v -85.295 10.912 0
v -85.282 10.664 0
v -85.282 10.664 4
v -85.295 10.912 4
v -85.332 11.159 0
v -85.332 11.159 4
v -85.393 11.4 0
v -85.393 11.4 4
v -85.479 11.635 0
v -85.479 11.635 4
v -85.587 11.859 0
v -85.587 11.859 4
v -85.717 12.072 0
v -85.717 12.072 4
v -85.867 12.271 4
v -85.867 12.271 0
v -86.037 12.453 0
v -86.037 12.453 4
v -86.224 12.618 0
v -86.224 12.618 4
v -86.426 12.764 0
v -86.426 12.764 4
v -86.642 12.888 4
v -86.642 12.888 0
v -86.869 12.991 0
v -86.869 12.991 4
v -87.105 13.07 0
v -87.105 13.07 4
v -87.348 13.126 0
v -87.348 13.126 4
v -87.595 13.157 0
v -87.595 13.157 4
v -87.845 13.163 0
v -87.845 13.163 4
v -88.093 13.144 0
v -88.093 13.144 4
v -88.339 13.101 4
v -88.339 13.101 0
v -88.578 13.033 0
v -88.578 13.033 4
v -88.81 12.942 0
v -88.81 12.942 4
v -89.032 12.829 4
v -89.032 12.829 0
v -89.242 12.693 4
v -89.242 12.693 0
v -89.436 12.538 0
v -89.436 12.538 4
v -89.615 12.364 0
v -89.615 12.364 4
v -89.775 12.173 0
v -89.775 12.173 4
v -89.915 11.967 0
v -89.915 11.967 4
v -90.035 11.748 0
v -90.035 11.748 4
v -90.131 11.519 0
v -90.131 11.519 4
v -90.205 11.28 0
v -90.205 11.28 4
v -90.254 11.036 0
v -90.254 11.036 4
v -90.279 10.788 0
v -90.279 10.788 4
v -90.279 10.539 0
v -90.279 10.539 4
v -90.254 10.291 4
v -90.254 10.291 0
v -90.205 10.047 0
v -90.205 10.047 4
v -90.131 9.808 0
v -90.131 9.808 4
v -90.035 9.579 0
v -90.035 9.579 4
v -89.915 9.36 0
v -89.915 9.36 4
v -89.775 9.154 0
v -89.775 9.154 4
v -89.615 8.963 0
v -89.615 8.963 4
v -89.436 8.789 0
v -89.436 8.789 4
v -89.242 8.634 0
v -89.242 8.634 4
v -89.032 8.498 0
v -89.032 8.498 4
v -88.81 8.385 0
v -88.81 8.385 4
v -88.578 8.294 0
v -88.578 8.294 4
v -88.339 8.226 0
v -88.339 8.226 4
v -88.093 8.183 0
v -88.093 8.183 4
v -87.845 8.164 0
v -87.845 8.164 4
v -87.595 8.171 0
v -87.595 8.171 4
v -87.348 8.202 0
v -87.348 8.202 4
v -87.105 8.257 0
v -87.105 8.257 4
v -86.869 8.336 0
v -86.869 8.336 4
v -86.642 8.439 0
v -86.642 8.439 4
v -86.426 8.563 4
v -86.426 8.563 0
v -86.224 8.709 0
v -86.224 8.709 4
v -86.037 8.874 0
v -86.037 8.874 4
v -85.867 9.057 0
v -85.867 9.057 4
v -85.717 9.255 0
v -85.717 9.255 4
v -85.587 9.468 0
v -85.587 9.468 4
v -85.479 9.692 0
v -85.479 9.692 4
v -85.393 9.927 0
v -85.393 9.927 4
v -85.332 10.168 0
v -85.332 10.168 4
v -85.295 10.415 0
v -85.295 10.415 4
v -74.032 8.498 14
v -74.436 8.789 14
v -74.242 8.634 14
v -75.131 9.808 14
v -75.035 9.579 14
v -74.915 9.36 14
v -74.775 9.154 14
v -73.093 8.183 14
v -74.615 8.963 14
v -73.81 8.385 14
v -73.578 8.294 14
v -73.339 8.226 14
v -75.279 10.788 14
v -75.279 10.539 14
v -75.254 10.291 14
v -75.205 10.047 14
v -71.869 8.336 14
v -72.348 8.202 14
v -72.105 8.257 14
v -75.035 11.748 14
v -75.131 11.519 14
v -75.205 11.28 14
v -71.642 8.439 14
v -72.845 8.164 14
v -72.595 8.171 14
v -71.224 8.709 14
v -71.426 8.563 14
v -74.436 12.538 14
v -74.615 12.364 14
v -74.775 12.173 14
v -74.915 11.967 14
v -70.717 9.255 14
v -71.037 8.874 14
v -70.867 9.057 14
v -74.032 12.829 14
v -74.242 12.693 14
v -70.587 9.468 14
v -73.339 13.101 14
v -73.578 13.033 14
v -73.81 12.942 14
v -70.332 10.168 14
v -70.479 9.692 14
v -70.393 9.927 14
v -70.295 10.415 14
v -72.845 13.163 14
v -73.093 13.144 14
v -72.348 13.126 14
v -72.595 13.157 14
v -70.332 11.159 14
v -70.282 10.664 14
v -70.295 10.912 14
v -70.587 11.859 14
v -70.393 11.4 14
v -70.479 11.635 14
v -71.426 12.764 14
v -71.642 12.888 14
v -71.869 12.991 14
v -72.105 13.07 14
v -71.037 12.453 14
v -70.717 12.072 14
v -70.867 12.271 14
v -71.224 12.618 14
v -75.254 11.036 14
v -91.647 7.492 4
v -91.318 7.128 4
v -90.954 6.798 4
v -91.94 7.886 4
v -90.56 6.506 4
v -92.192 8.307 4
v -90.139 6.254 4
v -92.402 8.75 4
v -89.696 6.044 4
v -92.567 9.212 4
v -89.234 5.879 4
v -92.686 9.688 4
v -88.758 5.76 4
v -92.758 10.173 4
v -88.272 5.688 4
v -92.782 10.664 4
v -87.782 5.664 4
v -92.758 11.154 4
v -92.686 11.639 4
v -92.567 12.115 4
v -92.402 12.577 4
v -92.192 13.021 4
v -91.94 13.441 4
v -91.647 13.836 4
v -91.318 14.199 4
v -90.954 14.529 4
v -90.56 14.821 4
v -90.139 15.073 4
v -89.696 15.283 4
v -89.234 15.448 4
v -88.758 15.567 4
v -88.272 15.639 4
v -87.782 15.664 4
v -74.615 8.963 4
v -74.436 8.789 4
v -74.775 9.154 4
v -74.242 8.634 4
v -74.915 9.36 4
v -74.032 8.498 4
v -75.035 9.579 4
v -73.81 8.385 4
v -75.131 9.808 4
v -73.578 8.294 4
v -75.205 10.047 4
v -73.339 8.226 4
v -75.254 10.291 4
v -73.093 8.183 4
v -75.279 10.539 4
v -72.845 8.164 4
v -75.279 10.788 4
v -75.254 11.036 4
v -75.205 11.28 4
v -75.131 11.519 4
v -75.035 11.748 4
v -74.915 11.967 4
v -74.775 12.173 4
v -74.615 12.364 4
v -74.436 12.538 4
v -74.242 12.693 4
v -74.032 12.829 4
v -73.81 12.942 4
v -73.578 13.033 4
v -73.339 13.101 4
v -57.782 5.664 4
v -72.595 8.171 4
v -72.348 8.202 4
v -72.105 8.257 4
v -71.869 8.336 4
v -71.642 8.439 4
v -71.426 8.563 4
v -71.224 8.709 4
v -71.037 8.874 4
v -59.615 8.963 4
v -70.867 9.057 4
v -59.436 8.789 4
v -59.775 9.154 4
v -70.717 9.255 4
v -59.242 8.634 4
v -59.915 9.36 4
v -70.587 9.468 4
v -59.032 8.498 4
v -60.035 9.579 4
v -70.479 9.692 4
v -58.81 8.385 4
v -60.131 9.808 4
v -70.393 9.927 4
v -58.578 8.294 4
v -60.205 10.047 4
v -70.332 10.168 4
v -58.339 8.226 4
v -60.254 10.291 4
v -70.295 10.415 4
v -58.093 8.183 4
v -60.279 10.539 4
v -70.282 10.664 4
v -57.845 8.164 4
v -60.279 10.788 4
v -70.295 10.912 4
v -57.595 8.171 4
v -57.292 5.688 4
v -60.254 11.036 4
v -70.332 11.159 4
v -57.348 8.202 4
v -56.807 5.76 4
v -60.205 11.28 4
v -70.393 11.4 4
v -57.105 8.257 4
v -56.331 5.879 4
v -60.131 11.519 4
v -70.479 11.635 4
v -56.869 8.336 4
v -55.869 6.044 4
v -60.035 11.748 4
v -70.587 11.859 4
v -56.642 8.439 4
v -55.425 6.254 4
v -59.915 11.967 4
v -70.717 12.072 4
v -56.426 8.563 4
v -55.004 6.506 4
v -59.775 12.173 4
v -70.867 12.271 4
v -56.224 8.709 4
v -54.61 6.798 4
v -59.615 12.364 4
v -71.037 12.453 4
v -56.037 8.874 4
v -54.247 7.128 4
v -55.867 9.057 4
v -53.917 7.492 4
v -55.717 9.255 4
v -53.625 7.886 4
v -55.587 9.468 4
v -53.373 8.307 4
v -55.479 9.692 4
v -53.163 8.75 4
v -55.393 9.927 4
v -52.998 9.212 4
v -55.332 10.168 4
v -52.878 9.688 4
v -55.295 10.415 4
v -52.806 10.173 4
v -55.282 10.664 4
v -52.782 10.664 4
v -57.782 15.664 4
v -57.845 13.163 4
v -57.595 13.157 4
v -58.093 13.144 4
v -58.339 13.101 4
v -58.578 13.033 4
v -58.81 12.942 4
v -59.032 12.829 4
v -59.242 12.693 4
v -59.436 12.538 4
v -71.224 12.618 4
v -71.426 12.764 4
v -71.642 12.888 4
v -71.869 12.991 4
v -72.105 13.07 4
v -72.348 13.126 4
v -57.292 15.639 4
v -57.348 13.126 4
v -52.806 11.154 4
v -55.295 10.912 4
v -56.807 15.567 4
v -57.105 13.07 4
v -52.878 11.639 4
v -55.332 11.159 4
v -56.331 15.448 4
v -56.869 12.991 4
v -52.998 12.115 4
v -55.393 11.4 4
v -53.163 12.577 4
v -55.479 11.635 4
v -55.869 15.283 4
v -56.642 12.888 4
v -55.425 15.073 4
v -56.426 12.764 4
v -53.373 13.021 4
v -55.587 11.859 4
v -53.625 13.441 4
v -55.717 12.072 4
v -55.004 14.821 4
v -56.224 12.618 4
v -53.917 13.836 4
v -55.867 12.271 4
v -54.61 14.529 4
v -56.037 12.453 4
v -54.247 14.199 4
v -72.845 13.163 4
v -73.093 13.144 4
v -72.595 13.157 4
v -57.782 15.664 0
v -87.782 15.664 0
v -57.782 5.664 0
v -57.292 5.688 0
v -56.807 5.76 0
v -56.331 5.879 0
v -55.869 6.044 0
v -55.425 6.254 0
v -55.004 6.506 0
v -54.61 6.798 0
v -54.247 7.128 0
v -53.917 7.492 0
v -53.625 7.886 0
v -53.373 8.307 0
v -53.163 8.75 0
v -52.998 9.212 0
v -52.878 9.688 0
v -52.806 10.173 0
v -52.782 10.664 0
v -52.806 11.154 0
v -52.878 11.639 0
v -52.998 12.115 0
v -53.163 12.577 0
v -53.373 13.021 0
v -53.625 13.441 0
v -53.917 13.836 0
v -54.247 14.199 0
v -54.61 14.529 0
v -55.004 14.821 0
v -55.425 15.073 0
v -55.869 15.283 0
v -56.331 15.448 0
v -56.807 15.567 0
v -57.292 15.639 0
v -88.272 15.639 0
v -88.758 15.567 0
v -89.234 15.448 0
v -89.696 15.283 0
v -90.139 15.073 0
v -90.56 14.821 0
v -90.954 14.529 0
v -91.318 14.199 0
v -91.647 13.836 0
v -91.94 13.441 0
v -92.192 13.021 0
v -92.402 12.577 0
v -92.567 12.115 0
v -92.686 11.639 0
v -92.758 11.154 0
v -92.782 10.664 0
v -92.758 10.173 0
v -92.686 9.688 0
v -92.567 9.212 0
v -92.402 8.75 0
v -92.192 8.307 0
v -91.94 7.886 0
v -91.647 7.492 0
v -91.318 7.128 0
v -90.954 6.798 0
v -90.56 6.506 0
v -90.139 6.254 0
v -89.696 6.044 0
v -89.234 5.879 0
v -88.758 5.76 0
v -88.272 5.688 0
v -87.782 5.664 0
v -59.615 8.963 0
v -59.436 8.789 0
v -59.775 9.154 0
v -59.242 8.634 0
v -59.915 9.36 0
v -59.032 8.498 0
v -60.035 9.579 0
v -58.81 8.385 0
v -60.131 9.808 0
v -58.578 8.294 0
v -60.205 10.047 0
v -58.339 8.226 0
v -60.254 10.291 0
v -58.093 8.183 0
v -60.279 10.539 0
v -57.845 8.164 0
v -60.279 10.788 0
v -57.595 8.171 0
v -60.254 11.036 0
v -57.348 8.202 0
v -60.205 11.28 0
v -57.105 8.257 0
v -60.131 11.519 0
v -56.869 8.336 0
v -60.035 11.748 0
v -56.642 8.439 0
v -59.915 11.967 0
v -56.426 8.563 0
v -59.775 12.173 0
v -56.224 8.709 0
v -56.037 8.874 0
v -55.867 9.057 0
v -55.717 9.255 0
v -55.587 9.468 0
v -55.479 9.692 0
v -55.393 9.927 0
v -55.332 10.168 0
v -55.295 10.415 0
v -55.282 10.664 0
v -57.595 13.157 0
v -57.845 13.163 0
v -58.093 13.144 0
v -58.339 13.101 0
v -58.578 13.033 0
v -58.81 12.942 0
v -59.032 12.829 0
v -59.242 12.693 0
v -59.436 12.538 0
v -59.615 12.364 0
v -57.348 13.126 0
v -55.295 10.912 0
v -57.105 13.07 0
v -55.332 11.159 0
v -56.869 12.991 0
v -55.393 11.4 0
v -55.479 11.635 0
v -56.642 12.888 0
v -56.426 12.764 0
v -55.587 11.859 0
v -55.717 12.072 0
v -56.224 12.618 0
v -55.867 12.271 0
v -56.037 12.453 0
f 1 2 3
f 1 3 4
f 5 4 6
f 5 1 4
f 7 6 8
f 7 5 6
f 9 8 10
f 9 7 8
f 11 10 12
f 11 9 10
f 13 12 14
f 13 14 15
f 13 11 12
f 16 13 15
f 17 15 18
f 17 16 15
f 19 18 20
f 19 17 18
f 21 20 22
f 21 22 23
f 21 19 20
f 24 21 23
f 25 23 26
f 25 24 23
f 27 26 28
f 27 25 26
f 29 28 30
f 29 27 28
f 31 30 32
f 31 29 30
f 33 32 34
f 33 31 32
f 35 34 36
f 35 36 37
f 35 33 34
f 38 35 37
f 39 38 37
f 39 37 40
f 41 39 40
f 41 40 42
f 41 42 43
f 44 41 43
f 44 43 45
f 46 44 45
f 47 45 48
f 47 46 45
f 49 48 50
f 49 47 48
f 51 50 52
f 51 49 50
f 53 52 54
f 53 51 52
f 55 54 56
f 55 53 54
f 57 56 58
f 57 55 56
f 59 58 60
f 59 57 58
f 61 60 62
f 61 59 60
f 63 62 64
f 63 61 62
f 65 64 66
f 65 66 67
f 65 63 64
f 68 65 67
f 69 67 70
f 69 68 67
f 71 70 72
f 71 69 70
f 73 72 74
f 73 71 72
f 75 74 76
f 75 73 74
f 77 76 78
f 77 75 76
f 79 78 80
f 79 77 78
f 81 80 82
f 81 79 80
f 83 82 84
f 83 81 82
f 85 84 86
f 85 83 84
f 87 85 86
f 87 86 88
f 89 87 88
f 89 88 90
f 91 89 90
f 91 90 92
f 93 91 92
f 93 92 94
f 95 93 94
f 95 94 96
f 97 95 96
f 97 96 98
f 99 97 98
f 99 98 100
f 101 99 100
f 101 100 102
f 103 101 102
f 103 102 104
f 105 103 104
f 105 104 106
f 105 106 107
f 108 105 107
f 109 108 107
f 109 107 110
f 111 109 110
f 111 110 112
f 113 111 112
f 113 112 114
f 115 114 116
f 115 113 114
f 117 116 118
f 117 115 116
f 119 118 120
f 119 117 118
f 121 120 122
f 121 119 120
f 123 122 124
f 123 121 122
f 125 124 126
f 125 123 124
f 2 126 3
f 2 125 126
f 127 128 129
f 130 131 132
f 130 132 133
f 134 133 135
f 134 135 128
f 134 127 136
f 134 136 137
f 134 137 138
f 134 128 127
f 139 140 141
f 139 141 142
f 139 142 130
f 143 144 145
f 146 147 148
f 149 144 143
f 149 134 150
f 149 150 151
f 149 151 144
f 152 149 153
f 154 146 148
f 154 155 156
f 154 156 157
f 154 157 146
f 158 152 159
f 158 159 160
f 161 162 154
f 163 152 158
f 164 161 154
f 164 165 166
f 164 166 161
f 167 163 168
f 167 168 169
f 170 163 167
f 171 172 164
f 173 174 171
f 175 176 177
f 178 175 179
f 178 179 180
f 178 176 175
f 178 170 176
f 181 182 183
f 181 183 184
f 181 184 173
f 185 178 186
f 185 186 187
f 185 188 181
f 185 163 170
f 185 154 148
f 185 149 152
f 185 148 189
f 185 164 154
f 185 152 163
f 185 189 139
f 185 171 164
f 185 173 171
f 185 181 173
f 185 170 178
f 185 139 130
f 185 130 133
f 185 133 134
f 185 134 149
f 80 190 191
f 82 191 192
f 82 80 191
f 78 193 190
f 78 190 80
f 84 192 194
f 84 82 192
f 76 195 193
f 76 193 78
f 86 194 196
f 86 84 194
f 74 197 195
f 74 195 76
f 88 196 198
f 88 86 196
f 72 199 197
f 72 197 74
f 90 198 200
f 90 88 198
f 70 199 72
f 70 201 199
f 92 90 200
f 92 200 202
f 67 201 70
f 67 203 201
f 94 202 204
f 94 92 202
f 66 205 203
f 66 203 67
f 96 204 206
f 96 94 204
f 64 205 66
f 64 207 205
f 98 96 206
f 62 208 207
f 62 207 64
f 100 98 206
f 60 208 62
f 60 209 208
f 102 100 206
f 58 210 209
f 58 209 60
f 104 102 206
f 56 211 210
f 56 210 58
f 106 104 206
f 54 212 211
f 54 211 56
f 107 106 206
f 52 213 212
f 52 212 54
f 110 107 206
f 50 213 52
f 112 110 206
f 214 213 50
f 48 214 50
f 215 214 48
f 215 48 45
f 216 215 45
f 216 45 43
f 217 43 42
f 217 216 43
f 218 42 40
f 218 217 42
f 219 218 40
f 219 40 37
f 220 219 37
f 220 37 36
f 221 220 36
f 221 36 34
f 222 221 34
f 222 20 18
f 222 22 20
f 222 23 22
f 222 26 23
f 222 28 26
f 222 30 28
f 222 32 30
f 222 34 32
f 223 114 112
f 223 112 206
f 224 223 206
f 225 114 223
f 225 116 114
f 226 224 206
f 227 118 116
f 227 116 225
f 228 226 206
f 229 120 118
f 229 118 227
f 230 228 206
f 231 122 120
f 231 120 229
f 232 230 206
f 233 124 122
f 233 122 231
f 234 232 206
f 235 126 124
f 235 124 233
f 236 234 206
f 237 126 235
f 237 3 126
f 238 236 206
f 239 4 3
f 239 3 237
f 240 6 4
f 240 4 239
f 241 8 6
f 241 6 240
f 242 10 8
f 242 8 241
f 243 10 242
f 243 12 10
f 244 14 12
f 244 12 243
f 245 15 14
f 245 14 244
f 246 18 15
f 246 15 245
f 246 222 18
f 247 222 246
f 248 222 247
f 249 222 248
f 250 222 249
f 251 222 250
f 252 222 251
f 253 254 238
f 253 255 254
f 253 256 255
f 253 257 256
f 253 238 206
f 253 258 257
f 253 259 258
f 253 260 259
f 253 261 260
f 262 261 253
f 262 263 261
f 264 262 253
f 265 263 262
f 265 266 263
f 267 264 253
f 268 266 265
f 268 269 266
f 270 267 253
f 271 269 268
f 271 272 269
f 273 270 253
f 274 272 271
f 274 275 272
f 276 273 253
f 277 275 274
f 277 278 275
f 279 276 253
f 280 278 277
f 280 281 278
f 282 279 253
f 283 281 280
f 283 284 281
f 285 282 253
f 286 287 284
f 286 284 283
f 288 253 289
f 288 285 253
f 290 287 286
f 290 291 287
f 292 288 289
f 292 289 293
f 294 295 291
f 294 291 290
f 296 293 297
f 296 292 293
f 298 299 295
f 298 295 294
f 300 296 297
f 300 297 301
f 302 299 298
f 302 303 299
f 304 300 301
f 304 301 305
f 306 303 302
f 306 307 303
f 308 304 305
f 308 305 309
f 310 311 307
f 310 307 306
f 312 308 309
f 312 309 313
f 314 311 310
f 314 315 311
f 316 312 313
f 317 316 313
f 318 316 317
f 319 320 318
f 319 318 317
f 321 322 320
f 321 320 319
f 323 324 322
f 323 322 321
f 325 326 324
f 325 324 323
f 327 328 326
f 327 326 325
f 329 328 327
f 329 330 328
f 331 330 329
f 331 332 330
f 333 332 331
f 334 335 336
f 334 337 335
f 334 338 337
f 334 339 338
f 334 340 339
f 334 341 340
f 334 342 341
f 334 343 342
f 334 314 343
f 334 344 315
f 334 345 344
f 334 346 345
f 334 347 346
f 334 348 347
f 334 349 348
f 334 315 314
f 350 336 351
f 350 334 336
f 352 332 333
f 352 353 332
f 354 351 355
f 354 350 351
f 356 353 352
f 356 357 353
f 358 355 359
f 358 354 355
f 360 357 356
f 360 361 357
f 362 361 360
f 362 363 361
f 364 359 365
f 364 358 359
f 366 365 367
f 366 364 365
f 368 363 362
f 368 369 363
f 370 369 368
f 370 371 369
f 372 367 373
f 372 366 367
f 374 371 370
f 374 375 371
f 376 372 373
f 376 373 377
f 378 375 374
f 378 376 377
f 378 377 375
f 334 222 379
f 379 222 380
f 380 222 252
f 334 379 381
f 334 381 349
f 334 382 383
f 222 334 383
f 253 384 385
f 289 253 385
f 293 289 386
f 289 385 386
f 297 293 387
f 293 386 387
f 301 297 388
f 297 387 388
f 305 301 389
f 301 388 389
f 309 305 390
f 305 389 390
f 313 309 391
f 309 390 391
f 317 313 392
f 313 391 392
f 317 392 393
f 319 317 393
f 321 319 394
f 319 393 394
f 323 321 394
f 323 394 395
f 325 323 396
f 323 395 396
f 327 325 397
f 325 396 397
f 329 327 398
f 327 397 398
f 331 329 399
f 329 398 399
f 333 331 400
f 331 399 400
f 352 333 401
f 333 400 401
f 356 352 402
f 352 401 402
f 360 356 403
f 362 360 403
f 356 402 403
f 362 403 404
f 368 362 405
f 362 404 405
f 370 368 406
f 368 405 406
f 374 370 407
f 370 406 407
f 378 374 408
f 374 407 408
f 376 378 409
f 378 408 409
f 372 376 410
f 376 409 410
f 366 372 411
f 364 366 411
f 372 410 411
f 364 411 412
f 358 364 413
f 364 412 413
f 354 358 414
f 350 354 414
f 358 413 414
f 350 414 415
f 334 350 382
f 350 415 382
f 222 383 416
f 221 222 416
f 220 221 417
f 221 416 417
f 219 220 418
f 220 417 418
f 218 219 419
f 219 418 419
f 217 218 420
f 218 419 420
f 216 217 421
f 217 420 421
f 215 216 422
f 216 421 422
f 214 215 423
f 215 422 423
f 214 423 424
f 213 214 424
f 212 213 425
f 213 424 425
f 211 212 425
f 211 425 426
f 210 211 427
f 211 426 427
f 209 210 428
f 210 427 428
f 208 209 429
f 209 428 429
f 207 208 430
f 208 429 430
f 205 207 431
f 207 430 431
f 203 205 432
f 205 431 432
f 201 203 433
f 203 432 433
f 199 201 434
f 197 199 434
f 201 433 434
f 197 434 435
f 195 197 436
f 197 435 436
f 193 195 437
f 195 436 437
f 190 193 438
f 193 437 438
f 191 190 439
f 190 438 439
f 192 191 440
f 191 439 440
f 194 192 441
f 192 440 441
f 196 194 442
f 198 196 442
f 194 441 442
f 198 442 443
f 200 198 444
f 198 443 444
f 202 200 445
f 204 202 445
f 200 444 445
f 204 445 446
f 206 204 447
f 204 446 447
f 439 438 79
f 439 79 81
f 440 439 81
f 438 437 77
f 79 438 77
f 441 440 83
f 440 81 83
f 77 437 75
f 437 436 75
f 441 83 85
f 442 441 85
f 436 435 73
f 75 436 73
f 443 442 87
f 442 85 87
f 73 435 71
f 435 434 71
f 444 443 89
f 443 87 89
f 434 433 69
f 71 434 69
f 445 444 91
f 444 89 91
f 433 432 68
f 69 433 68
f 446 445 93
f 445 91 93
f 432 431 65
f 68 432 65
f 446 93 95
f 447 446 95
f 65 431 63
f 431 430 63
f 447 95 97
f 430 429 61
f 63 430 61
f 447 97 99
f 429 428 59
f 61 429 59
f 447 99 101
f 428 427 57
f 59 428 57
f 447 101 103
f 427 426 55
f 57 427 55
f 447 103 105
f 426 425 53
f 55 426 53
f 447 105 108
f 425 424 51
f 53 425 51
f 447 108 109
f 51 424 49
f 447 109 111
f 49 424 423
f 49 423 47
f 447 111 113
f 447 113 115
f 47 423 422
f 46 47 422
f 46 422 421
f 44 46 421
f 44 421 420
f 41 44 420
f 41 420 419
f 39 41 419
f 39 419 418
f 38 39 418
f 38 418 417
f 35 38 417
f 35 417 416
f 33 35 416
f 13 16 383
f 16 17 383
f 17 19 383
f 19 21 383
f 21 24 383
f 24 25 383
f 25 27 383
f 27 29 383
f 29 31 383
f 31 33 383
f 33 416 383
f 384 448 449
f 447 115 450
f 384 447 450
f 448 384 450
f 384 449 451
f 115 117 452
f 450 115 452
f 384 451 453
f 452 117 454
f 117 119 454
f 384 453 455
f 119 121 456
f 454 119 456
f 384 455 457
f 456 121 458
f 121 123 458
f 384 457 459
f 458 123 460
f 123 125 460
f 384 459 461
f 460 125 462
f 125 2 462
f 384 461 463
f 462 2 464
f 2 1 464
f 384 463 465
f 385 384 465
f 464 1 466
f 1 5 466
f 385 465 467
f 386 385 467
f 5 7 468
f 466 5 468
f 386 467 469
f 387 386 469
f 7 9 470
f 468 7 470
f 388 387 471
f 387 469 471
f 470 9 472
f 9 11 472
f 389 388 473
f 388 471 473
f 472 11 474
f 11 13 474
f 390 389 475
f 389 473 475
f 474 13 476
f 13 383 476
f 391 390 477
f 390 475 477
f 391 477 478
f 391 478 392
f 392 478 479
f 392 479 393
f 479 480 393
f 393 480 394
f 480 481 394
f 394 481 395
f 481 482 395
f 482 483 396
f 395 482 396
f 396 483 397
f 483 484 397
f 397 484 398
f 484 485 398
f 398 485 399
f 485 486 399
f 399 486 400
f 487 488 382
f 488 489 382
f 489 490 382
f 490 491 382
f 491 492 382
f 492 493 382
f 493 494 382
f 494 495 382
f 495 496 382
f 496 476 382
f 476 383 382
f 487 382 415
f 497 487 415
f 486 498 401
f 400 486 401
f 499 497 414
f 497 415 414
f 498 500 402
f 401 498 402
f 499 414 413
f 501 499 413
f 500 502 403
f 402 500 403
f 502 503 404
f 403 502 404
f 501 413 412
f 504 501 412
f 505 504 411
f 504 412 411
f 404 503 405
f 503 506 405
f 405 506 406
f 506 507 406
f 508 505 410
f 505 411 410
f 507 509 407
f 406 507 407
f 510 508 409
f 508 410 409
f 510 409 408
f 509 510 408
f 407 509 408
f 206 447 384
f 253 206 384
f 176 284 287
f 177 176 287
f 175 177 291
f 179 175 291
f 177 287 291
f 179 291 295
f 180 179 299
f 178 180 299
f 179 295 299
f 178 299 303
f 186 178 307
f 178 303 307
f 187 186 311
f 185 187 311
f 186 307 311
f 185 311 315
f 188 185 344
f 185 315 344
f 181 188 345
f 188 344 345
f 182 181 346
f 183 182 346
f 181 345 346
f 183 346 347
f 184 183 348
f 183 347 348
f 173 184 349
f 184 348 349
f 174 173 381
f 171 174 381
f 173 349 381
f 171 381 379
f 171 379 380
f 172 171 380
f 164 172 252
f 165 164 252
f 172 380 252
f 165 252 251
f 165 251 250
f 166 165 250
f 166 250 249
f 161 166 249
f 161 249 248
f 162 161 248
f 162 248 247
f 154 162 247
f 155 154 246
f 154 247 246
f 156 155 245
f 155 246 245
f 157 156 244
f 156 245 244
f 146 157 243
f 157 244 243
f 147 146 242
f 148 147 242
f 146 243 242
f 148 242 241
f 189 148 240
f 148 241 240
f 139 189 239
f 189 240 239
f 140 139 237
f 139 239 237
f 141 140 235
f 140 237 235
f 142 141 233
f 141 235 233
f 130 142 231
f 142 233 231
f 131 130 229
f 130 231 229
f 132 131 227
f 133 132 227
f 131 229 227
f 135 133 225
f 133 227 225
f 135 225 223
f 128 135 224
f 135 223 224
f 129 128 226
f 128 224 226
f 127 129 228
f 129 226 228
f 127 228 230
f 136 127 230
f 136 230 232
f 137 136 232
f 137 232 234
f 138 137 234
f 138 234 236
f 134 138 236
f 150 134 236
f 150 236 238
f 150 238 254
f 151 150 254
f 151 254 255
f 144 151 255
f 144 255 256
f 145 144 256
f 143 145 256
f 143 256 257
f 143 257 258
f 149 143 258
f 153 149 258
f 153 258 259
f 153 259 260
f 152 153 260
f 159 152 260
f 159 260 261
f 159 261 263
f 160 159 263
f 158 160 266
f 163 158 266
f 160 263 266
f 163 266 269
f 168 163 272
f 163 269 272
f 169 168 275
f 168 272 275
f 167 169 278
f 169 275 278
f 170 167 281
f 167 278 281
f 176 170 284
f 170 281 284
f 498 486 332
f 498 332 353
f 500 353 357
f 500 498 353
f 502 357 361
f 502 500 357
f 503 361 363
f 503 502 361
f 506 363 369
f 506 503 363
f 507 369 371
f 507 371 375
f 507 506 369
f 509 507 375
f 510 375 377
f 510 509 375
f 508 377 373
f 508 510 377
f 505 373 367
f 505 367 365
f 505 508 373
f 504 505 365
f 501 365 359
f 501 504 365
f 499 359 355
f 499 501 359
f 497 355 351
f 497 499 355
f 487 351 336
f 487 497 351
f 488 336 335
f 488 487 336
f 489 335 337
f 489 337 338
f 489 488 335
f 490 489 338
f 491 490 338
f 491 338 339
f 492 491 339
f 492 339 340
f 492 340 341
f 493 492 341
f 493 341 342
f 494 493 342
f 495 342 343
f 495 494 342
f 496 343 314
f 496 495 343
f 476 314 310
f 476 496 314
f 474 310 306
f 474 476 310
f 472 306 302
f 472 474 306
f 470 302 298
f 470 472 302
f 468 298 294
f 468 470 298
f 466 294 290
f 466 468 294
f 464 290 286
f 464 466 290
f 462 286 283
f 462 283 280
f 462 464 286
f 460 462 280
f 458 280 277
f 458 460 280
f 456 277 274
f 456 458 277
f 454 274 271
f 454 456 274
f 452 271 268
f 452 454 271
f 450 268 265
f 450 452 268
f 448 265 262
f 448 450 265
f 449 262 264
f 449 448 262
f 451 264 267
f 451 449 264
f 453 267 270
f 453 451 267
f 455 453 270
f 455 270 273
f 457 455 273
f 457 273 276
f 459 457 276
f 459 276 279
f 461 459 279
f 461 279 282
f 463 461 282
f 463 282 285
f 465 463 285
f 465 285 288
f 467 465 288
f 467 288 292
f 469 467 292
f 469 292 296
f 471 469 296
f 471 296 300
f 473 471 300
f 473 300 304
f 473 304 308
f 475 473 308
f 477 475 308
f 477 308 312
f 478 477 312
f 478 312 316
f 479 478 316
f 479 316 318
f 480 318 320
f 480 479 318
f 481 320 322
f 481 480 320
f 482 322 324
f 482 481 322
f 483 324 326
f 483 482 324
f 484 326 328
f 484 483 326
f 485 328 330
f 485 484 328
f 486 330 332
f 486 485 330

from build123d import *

# Parameters (mm, degrees)
SKETCH1_R           = 2.5
BOSS_EXTRUDE1_DEPTH = 4
SKETCH2_R           = 2.5
BOSS_EXTRUDE2_DEPTH = 10


with BuildPart() as part:
    # Sketch1 → Boss-Extrude1 (new body)
    with BuildSketch(Plane.XY):
        with BuildLine():
            Line((-57.782253853, 15.663533632), (-87.782253853, 15.663533632))
            ThreePointArc((-87.782253853, 15.663533632), (-92.782253853, 10.663533632), (-87.782253853, 5.663533632))
            Line((-87.782253853, 5.663533632), (-57.782253853, 5.663533632))
            ThreePointArc((-57.782253853, 5.663533632), (-52.782253853, 10.663533632), (-57.782253853, 15.663533632))
        make_face()
        with Locations((-57.782253853, 10.663533632)):
            Circle(SKETCH1_R, mode=Mode.SUBTRACT)
        with Locations((-87.782253853, 10.663533632)):
            Circle(SKETCH1_R, mode=Mode.SUBTRACT)
    extrude(amount=BOSS_EXTRUDE1_DEPTH)

    # Sketch2 → Boss-Extrude2 (add)
    with BuildSketch(Plane.XY.offset(4)):
        with Locations((-72.782253853, 10.663533632)):
            Circle(SKETCH2_R)
    extrude(amount=BOSS_EXTRUDE2_DEPTH)


solid = part.part
